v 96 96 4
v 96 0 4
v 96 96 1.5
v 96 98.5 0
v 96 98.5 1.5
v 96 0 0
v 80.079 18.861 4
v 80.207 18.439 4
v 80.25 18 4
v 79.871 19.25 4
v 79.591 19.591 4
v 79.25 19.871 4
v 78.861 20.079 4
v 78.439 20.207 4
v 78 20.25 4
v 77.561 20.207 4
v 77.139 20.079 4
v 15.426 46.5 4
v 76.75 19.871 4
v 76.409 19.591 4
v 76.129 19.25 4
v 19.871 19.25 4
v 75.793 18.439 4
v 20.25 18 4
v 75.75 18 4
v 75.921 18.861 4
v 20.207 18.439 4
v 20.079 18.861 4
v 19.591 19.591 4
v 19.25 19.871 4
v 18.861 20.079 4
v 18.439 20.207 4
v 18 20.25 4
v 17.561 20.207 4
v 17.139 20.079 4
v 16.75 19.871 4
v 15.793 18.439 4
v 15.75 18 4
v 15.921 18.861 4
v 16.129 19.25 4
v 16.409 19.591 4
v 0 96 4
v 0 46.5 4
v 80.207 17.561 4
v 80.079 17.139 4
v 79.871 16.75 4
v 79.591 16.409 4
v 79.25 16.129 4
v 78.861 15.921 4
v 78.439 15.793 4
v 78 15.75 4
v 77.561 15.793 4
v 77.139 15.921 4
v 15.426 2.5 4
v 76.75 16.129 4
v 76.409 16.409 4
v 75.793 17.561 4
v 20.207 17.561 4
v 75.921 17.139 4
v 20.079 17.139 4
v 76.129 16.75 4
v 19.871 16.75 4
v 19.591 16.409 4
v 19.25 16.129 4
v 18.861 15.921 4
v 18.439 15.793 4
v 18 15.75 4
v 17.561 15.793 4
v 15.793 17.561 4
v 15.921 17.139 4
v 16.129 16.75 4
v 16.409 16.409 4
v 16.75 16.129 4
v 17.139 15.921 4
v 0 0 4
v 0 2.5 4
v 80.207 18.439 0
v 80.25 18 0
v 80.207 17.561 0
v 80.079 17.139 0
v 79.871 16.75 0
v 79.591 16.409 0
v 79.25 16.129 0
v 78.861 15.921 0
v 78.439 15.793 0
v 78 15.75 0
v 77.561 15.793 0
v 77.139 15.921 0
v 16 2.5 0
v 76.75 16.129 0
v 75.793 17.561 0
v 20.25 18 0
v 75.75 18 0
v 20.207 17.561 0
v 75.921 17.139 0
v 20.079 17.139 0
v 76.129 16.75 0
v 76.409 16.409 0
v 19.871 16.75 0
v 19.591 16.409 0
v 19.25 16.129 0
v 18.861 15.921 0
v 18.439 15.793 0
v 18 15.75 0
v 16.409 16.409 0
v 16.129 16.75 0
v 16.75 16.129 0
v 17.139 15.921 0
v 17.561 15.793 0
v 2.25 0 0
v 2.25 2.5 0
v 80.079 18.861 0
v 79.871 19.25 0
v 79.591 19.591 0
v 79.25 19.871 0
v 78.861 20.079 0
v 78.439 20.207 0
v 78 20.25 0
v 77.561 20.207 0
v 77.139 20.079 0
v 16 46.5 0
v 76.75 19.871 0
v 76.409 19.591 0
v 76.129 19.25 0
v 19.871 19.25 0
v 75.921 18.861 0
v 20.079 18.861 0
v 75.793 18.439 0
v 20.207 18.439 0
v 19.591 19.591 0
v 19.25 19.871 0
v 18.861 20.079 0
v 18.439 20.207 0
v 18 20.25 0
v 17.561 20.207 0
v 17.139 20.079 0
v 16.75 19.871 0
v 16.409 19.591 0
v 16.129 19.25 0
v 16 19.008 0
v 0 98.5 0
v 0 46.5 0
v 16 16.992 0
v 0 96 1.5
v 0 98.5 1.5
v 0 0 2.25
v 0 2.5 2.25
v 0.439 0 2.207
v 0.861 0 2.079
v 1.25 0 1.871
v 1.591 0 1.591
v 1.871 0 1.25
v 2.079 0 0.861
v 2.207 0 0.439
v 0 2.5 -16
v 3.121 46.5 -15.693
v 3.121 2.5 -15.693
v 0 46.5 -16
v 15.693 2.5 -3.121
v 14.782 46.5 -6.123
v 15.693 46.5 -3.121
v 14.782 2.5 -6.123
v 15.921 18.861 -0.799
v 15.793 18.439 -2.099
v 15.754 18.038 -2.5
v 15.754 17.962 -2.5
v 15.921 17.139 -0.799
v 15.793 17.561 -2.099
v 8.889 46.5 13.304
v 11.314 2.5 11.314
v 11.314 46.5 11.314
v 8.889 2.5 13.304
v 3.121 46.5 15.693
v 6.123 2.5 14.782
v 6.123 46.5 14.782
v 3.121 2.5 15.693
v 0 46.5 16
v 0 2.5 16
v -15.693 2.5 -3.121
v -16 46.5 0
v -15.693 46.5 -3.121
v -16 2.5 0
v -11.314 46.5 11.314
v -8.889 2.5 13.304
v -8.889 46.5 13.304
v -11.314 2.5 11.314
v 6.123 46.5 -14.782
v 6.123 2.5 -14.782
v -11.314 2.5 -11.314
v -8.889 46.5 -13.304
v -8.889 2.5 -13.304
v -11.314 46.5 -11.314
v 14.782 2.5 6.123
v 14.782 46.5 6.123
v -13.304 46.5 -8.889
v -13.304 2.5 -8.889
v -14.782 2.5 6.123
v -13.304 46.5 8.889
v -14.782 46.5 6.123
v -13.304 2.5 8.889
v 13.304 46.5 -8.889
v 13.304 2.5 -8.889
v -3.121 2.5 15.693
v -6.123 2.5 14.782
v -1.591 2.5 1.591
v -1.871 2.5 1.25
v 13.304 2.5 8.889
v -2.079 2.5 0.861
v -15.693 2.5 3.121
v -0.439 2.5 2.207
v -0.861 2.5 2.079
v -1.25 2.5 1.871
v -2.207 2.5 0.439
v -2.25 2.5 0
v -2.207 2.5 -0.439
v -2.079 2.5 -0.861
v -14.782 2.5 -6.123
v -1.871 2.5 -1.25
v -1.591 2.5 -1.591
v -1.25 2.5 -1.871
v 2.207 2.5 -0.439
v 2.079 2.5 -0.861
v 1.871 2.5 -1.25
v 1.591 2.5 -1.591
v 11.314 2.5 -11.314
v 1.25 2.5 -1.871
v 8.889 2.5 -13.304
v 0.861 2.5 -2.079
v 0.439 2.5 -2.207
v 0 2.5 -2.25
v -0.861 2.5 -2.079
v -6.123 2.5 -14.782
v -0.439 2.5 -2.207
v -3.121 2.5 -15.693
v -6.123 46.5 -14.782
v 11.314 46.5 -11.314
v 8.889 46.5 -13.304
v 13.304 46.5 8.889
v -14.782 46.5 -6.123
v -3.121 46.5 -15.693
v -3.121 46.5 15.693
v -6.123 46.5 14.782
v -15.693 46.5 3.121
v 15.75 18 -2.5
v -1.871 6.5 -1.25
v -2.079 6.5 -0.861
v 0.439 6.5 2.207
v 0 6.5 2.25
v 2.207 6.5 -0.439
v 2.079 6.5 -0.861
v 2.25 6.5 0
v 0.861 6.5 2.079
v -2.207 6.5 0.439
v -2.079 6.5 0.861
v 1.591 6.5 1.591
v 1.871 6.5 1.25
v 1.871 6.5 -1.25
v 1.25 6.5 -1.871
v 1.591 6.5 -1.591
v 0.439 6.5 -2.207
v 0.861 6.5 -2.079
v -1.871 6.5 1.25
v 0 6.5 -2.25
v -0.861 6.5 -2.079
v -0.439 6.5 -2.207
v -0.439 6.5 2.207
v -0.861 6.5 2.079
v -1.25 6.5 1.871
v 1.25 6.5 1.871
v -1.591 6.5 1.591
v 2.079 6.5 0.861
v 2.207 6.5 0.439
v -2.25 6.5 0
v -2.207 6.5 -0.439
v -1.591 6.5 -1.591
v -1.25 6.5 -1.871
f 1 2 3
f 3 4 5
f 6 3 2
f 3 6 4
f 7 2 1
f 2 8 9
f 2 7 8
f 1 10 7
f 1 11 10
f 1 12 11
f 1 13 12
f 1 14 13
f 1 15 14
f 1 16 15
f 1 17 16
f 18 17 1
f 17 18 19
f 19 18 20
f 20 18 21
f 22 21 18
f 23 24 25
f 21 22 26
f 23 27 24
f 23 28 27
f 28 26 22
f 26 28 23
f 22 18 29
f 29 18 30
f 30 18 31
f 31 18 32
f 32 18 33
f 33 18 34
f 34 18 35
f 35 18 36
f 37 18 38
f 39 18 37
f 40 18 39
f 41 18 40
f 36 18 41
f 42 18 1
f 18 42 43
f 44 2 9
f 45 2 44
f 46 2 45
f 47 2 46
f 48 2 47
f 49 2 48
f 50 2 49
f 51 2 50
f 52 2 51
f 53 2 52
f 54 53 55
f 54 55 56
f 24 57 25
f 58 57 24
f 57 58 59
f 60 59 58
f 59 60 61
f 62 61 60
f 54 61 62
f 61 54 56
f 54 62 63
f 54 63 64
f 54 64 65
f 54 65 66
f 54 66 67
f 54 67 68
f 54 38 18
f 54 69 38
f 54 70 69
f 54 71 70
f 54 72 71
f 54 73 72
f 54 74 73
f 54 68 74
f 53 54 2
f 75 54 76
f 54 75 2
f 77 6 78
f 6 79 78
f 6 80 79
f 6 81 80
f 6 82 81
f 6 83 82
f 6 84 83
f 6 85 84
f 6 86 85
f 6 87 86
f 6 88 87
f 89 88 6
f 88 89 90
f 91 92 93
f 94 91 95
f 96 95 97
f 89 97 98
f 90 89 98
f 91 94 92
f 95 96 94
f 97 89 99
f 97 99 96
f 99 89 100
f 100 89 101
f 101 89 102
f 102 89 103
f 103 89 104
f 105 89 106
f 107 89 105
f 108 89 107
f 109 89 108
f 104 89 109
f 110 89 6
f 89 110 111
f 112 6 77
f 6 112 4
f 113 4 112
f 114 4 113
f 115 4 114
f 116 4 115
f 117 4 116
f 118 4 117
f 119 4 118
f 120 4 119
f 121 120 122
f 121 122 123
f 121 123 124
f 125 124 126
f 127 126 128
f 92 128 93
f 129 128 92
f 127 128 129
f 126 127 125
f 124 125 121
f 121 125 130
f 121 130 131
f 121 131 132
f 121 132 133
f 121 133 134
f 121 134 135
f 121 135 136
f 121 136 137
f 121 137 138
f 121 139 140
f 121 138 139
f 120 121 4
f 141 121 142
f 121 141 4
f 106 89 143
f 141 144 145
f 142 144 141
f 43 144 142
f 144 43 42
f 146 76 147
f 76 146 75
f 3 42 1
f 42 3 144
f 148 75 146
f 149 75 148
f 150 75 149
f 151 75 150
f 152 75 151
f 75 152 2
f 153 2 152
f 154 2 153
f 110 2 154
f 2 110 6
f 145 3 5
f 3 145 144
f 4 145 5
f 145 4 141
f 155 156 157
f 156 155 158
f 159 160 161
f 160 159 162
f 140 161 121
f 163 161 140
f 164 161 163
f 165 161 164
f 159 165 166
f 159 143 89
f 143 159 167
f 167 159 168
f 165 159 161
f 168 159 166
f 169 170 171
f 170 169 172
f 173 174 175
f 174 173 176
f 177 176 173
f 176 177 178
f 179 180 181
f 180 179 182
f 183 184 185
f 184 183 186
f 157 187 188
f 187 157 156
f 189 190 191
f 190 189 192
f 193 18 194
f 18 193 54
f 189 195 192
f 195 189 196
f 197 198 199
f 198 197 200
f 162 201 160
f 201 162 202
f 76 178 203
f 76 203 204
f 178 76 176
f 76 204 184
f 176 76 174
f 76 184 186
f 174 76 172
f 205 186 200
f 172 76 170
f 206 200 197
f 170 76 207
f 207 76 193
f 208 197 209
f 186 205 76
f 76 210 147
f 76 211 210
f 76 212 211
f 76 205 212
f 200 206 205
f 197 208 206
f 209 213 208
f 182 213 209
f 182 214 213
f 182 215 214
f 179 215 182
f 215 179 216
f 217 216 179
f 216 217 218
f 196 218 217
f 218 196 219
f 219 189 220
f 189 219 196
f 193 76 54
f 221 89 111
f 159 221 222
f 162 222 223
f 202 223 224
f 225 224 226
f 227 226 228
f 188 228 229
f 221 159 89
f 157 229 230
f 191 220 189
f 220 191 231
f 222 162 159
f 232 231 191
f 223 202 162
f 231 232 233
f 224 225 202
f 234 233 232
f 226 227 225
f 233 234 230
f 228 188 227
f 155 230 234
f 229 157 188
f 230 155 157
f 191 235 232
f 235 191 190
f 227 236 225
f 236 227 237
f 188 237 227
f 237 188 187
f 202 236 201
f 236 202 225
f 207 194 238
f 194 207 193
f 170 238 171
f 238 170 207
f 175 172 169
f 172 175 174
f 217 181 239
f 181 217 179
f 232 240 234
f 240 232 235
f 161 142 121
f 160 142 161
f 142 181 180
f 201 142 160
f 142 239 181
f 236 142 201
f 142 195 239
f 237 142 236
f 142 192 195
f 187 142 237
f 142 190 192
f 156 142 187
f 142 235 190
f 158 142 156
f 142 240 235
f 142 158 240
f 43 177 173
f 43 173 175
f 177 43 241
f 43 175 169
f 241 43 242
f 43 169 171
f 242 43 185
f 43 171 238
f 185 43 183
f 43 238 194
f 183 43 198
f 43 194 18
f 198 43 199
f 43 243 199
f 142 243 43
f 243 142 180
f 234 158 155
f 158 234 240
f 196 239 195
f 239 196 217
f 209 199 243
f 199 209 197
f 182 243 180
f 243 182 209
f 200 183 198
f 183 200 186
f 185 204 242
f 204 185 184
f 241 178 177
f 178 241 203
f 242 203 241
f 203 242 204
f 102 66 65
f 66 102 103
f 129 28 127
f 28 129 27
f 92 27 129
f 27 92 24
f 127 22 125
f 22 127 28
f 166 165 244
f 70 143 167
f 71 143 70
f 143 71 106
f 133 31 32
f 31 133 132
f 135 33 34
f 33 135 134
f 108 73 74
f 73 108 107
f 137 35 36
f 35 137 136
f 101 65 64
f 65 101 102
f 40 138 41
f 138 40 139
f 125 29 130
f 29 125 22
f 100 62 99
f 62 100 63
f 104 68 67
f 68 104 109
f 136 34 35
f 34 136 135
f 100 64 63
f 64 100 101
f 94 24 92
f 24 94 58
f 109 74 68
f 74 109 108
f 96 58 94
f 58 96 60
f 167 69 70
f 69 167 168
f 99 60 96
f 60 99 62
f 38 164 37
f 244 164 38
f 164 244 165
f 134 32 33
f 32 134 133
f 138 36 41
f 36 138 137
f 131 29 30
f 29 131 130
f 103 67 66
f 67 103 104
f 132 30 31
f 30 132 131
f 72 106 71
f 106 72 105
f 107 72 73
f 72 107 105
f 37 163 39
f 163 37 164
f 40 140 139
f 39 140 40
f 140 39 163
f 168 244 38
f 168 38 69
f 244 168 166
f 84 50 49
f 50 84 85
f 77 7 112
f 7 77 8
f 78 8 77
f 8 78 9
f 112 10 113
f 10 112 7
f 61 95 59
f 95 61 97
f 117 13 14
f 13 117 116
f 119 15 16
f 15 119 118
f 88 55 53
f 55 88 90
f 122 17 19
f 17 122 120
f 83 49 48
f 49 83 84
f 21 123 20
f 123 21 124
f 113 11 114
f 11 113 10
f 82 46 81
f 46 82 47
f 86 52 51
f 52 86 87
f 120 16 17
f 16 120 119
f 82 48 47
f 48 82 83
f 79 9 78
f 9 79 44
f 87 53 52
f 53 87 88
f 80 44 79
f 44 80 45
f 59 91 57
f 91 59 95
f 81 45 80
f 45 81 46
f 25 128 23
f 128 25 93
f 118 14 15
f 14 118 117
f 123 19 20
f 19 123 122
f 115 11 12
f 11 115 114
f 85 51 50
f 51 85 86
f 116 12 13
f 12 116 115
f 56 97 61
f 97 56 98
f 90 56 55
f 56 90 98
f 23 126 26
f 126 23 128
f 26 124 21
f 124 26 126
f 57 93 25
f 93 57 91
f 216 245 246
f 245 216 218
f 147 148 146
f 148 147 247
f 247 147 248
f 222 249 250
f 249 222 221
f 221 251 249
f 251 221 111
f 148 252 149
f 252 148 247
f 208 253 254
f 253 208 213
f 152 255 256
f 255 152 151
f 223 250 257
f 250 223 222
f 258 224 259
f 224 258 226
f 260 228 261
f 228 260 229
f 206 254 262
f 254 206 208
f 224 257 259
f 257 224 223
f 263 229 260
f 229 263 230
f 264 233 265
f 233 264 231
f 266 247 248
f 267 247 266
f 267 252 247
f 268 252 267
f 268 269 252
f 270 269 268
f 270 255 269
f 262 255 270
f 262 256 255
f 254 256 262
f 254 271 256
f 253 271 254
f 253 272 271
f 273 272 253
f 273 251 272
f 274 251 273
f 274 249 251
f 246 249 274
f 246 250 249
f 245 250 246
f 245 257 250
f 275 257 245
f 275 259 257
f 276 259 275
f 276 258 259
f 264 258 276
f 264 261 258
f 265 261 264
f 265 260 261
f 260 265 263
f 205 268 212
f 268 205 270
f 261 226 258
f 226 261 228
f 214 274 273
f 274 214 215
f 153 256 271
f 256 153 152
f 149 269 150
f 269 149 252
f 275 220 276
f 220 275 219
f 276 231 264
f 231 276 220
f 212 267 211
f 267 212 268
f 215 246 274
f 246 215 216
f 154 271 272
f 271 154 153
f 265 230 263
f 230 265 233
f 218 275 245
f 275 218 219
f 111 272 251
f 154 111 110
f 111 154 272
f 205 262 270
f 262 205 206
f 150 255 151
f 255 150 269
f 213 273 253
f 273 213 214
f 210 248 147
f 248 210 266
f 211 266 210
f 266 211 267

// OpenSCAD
$fn = 32;
// ----------------------------------------------------------------------
// Flange: 96 x 96 x 10 mm
// ----------------------------------------------------------------------
// --- parameters (mm) ---
flange_d = 96;            // flange outside diameter
flange_l = 96;            // flange length
flange_t = 4;             // flange thickness
hub_d = 32;               // hub diameter
hub_l = 24;               // hub length
bolt_d = 4.5;             // bolt hole diameter
bolt_n = 16;              // bolt holes per side
bolt_pitch = 19;          // bolt pitch
module hole_z(px, py) {
  translate([px, py, -2.5]) cylinder(h = flange_t + 5, d = bolt_d);
}
module hole_y_pz(pz) {
  /* through both flanges along the y axis, with a 2.5 mm gap in the hub */
  translate([0, -2.5, pz]) rotate([-90, 0, 0]) cylinder(h = flange_t + 5, d = bolt_d);
}
module base() {
  cube([flange_l, flange_d, flange_t]);
}
module flange() {
  /* flange with a raised rim around the hub */
  translate([0, flange_t - 1.5, 0])
    cube([flange_l, flange_d, flange_t - 2.5]);
}
module hub() {
  translate([0, flange_t - 1.5, 0]) rotate([-90, 0, 0])
    cylinder(h = flange_t + 2 * (hub_l - flange_t), d = hub_d);
}
difference() {
  union() {
    base();
    flange();
    hub();
  }
  hole_z(18, 18);
  hole_z(78, 18);
  /* through both flanges along the y axis, with a 2.5 mm gap in the hub */
  translate([0, -2.5, 0]) rotate([-90, 0, 0]) cylinder(h = flange_t + 5, d = bolt_d);
}
